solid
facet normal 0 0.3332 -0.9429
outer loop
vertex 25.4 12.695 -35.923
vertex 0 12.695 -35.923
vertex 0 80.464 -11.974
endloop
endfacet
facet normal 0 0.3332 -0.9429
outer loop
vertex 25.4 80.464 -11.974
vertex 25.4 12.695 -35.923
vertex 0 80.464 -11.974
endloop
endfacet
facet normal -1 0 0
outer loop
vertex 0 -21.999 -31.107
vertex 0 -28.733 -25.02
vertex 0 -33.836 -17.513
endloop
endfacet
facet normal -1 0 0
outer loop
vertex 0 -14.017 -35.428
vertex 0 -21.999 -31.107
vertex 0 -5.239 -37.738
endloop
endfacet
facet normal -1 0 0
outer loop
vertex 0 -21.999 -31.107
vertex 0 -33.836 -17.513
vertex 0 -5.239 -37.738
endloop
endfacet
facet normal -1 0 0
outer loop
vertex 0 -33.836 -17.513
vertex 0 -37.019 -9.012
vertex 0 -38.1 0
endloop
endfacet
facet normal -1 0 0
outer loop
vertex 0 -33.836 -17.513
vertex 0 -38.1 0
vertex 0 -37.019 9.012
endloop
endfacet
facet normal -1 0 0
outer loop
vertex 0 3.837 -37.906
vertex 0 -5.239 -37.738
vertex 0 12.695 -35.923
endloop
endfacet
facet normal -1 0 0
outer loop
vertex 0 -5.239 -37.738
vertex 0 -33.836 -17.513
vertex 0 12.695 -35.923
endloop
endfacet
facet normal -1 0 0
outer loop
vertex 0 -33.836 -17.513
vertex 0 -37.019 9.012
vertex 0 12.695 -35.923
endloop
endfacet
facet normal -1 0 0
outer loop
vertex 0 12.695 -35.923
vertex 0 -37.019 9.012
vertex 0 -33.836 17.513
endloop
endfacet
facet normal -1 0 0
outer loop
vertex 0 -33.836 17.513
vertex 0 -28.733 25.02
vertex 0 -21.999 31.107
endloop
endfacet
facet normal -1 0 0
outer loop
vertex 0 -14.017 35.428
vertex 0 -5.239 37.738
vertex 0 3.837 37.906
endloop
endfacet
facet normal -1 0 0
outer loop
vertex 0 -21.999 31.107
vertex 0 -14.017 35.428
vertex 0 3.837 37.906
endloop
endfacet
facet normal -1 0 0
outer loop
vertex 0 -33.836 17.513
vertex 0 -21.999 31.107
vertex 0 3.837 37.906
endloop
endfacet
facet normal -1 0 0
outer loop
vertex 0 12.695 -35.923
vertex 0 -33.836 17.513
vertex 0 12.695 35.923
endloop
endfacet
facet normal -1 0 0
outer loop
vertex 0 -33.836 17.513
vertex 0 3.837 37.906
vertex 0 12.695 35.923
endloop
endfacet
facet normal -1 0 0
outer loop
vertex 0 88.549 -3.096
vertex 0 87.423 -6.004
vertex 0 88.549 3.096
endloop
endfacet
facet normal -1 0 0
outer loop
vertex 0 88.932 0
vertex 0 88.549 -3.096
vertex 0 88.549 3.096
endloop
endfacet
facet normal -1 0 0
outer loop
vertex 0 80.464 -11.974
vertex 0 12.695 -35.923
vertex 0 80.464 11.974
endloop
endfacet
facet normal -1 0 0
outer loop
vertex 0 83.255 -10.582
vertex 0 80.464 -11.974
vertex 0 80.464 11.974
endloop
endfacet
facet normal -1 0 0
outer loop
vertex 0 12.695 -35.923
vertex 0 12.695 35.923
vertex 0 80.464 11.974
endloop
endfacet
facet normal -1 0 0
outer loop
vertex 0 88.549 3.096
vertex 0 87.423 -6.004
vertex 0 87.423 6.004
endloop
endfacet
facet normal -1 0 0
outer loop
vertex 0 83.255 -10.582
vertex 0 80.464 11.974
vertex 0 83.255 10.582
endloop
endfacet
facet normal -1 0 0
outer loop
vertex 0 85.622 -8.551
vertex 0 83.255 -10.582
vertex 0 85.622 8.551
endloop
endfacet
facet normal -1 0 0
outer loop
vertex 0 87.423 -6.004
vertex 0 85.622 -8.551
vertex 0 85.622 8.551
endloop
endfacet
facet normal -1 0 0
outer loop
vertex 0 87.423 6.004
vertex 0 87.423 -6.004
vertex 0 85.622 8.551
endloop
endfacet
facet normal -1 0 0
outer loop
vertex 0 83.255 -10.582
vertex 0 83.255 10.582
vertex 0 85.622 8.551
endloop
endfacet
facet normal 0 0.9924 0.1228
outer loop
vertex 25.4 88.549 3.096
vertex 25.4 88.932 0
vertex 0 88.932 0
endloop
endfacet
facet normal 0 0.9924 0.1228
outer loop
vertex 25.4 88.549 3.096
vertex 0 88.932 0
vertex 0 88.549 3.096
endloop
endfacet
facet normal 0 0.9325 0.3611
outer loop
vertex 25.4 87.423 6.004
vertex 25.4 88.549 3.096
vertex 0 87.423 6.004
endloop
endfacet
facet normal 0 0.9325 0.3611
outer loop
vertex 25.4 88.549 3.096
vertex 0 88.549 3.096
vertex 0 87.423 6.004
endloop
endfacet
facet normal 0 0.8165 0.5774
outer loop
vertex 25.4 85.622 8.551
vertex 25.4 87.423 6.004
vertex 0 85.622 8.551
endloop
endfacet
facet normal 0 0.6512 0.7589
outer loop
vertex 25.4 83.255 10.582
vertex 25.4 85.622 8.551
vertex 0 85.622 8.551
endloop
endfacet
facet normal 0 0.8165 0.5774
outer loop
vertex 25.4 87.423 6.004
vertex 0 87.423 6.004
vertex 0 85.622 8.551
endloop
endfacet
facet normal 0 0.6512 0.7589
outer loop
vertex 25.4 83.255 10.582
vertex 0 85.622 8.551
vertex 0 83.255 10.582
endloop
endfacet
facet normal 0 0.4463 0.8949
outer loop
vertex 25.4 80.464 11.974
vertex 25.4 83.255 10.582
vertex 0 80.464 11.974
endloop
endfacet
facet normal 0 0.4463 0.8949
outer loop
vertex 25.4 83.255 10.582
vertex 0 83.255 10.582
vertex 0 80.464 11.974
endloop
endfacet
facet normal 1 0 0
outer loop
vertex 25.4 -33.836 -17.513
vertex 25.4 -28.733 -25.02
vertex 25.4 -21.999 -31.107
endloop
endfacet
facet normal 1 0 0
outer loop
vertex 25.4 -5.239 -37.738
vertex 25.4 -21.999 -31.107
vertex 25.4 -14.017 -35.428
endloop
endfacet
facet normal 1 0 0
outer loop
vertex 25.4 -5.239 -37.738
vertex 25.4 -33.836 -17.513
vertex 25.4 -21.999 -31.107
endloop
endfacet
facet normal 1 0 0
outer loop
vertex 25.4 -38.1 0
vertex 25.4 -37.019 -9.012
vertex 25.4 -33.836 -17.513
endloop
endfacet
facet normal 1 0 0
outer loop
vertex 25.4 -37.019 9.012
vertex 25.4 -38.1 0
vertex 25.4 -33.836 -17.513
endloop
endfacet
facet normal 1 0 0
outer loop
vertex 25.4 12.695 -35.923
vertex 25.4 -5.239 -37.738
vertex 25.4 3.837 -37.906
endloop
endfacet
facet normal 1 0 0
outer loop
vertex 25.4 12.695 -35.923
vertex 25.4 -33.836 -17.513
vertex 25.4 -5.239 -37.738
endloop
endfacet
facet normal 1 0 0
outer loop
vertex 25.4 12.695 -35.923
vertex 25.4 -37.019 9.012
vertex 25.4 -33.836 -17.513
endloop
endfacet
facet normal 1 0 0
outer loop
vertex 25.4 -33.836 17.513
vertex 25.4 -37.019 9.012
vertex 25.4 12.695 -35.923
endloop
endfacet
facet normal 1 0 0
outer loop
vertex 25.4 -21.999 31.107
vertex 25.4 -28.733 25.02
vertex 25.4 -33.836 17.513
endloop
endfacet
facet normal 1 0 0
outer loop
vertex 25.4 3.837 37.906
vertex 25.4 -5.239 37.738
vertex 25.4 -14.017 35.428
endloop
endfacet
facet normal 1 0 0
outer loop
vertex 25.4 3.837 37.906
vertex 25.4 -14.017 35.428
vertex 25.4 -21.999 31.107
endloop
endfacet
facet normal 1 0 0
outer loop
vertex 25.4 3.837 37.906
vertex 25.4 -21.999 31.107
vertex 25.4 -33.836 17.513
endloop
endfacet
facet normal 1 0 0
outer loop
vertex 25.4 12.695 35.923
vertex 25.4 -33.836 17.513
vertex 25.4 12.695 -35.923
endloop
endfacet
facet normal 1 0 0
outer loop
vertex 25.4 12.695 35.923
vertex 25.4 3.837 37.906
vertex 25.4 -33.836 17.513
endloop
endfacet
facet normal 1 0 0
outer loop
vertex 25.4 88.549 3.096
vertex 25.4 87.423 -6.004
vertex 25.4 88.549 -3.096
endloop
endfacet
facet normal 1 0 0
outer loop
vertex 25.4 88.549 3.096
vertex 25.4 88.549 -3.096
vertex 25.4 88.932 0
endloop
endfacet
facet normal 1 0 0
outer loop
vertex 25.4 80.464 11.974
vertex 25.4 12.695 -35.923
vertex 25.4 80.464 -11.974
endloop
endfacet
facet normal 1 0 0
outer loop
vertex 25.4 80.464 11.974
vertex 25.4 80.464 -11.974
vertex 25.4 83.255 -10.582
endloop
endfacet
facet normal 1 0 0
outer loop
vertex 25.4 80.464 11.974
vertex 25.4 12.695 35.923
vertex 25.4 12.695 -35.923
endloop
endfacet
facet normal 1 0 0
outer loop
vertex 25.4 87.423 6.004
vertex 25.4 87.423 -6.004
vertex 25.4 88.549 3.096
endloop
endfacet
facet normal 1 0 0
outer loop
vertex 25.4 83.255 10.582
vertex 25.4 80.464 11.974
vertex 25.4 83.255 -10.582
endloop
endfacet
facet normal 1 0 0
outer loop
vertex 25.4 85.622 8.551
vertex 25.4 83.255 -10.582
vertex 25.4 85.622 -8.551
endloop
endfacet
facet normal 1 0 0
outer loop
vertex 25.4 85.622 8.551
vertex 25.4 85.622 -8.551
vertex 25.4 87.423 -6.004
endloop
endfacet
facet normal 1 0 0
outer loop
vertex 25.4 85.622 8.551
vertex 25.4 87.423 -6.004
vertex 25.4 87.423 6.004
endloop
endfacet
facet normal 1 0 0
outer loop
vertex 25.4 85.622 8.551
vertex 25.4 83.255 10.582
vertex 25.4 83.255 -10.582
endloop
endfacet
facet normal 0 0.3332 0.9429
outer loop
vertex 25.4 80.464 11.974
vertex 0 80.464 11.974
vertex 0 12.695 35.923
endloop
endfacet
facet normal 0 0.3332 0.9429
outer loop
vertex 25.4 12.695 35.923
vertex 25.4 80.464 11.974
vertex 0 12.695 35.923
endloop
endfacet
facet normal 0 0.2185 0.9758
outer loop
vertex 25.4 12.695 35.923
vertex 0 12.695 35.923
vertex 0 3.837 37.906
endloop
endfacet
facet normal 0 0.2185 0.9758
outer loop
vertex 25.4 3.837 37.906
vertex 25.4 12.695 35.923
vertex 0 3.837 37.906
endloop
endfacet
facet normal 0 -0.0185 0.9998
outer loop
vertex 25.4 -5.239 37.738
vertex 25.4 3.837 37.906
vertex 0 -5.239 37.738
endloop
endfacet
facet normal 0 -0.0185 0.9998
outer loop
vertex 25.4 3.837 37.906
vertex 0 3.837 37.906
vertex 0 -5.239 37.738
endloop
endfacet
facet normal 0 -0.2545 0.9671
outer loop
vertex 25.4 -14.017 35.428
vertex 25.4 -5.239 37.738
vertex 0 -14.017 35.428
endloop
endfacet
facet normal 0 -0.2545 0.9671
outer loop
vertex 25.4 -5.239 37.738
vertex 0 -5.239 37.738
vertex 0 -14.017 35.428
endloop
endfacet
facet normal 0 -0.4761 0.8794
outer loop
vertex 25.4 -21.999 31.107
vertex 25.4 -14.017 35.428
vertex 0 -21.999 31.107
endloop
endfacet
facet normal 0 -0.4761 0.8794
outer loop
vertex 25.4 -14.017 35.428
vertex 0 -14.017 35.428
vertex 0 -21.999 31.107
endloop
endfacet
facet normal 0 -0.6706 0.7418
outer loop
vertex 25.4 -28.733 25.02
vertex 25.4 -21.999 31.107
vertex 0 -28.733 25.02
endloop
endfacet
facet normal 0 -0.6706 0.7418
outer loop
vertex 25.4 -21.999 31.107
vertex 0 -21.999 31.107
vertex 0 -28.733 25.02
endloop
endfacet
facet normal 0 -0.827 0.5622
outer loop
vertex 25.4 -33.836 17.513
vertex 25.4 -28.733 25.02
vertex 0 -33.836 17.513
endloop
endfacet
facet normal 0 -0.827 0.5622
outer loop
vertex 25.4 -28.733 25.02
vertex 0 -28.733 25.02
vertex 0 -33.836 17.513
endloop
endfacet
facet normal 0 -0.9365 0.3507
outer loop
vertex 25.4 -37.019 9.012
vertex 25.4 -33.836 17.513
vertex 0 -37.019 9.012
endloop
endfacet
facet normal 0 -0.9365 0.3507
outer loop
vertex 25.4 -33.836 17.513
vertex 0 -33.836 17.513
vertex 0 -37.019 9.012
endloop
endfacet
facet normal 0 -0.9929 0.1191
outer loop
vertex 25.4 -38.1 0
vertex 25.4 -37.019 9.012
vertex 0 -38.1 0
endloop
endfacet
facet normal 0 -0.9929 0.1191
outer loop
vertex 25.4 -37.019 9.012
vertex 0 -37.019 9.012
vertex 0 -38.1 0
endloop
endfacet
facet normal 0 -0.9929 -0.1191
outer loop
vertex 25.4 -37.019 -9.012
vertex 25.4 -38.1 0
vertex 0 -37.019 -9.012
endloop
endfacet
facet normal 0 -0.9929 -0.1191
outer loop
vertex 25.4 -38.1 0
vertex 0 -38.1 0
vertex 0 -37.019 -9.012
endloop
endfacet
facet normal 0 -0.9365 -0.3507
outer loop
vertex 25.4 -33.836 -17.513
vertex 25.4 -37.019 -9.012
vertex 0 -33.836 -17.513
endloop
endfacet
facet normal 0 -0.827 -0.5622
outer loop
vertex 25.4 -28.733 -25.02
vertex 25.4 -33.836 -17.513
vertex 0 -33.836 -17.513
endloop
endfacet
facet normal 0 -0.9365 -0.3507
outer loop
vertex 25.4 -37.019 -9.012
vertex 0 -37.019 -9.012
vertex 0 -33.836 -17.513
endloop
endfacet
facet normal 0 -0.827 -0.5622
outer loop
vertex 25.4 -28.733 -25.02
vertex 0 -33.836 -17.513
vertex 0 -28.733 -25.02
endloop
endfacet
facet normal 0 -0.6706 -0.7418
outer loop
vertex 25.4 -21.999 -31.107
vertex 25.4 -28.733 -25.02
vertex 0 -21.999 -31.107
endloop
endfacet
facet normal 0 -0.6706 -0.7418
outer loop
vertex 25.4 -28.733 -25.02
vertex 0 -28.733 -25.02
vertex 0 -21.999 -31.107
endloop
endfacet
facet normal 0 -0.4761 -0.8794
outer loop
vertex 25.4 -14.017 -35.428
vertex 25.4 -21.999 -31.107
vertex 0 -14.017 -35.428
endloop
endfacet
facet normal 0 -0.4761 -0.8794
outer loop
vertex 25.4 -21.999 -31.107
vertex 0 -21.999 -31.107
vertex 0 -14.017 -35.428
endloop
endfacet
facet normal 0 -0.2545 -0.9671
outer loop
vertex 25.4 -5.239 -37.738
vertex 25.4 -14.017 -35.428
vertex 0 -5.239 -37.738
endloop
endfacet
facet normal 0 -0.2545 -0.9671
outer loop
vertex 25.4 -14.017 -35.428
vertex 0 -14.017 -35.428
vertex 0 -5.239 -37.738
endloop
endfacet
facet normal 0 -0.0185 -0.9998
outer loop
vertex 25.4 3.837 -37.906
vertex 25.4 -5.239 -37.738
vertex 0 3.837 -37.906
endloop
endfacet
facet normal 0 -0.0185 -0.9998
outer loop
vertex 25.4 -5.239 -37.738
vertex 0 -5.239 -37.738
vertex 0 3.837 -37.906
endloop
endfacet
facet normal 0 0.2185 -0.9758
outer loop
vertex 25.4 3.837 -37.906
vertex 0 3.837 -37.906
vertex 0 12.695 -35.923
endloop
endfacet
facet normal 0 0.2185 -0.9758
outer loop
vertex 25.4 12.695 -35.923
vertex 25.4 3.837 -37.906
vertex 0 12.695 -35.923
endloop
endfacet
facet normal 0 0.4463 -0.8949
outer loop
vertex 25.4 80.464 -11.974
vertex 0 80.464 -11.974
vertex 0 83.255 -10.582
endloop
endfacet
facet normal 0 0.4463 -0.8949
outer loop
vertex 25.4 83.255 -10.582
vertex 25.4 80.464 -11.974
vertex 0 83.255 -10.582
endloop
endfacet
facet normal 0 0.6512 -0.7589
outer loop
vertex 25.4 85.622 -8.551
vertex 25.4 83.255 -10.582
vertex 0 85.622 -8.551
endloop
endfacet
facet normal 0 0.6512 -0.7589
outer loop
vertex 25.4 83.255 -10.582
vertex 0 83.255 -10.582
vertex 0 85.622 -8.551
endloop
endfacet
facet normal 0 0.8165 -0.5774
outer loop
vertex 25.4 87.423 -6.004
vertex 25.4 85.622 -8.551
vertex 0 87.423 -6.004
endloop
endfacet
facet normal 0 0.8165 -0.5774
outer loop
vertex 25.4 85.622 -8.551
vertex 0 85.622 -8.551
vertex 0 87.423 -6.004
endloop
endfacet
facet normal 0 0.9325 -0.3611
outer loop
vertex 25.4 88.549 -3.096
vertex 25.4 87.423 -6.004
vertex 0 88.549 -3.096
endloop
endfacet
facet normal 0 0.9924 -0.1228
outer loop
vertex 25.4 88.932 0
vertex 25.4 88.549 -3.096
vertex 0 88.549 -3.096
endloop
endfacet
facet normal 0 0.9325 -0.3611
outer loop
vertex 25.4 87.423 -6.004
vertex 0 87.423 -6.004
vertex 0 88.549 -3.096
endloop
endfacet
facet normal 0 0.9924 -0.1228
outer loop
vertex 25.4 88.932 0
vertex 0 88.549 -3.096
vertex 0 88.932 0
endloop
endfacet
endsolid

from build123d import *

# Parameters (mm, degrees)
F1_DEPTH = 25.4


with BuildPart() as f1:
    # F0 (on Right) → F1 (new body)
    with BuildSketch(Plane.YZ):
        with BuildLine():
            ThreePointArc((88.932255, 0), (86.601213, 7.333124), (80.463797, 11.974308))
            ThreePointArc((80.463797, 11.974308), (63.532255, 0), (80.463797, -11.974308))
            ThreePointArc((80.463797, -11.974308), (86.601213, -7.333124), (88.932255, 0))
        make_face()
        with BuildLine():
            ThreePointArc((12.694627, 35.922924), (31.106874, 21.999372), (38.1, 0))
            ThreePointArc((38.1, 0), (31.106874, -21.999372), (12.694627, -35.922924))
            Line((12.694627, -35.922924), (80.463797, -11.974308))
            ThreePointArc((80.463797, -11.974308), (63.532255, 0), (80.463797, 11.974308))
            Line((80.463797, 11.974308), (12.694627, 35.922924))
        make_face()
        with BuildLine():
            ThreePointArc((12.694627, -35.922924), (31.106874, -21.999372), (38.1, 0))
            ThreePointArc((38.1, 0), (31.106874, 21.999372), (12.694627, 35.922924))
            ThreePointArc((12.694627, 35.922924), (-38.1, 0), (12.694627, -35.922924))
        make_face()
    extrude(amount=F1_DEPTH)


solid = f1.part
